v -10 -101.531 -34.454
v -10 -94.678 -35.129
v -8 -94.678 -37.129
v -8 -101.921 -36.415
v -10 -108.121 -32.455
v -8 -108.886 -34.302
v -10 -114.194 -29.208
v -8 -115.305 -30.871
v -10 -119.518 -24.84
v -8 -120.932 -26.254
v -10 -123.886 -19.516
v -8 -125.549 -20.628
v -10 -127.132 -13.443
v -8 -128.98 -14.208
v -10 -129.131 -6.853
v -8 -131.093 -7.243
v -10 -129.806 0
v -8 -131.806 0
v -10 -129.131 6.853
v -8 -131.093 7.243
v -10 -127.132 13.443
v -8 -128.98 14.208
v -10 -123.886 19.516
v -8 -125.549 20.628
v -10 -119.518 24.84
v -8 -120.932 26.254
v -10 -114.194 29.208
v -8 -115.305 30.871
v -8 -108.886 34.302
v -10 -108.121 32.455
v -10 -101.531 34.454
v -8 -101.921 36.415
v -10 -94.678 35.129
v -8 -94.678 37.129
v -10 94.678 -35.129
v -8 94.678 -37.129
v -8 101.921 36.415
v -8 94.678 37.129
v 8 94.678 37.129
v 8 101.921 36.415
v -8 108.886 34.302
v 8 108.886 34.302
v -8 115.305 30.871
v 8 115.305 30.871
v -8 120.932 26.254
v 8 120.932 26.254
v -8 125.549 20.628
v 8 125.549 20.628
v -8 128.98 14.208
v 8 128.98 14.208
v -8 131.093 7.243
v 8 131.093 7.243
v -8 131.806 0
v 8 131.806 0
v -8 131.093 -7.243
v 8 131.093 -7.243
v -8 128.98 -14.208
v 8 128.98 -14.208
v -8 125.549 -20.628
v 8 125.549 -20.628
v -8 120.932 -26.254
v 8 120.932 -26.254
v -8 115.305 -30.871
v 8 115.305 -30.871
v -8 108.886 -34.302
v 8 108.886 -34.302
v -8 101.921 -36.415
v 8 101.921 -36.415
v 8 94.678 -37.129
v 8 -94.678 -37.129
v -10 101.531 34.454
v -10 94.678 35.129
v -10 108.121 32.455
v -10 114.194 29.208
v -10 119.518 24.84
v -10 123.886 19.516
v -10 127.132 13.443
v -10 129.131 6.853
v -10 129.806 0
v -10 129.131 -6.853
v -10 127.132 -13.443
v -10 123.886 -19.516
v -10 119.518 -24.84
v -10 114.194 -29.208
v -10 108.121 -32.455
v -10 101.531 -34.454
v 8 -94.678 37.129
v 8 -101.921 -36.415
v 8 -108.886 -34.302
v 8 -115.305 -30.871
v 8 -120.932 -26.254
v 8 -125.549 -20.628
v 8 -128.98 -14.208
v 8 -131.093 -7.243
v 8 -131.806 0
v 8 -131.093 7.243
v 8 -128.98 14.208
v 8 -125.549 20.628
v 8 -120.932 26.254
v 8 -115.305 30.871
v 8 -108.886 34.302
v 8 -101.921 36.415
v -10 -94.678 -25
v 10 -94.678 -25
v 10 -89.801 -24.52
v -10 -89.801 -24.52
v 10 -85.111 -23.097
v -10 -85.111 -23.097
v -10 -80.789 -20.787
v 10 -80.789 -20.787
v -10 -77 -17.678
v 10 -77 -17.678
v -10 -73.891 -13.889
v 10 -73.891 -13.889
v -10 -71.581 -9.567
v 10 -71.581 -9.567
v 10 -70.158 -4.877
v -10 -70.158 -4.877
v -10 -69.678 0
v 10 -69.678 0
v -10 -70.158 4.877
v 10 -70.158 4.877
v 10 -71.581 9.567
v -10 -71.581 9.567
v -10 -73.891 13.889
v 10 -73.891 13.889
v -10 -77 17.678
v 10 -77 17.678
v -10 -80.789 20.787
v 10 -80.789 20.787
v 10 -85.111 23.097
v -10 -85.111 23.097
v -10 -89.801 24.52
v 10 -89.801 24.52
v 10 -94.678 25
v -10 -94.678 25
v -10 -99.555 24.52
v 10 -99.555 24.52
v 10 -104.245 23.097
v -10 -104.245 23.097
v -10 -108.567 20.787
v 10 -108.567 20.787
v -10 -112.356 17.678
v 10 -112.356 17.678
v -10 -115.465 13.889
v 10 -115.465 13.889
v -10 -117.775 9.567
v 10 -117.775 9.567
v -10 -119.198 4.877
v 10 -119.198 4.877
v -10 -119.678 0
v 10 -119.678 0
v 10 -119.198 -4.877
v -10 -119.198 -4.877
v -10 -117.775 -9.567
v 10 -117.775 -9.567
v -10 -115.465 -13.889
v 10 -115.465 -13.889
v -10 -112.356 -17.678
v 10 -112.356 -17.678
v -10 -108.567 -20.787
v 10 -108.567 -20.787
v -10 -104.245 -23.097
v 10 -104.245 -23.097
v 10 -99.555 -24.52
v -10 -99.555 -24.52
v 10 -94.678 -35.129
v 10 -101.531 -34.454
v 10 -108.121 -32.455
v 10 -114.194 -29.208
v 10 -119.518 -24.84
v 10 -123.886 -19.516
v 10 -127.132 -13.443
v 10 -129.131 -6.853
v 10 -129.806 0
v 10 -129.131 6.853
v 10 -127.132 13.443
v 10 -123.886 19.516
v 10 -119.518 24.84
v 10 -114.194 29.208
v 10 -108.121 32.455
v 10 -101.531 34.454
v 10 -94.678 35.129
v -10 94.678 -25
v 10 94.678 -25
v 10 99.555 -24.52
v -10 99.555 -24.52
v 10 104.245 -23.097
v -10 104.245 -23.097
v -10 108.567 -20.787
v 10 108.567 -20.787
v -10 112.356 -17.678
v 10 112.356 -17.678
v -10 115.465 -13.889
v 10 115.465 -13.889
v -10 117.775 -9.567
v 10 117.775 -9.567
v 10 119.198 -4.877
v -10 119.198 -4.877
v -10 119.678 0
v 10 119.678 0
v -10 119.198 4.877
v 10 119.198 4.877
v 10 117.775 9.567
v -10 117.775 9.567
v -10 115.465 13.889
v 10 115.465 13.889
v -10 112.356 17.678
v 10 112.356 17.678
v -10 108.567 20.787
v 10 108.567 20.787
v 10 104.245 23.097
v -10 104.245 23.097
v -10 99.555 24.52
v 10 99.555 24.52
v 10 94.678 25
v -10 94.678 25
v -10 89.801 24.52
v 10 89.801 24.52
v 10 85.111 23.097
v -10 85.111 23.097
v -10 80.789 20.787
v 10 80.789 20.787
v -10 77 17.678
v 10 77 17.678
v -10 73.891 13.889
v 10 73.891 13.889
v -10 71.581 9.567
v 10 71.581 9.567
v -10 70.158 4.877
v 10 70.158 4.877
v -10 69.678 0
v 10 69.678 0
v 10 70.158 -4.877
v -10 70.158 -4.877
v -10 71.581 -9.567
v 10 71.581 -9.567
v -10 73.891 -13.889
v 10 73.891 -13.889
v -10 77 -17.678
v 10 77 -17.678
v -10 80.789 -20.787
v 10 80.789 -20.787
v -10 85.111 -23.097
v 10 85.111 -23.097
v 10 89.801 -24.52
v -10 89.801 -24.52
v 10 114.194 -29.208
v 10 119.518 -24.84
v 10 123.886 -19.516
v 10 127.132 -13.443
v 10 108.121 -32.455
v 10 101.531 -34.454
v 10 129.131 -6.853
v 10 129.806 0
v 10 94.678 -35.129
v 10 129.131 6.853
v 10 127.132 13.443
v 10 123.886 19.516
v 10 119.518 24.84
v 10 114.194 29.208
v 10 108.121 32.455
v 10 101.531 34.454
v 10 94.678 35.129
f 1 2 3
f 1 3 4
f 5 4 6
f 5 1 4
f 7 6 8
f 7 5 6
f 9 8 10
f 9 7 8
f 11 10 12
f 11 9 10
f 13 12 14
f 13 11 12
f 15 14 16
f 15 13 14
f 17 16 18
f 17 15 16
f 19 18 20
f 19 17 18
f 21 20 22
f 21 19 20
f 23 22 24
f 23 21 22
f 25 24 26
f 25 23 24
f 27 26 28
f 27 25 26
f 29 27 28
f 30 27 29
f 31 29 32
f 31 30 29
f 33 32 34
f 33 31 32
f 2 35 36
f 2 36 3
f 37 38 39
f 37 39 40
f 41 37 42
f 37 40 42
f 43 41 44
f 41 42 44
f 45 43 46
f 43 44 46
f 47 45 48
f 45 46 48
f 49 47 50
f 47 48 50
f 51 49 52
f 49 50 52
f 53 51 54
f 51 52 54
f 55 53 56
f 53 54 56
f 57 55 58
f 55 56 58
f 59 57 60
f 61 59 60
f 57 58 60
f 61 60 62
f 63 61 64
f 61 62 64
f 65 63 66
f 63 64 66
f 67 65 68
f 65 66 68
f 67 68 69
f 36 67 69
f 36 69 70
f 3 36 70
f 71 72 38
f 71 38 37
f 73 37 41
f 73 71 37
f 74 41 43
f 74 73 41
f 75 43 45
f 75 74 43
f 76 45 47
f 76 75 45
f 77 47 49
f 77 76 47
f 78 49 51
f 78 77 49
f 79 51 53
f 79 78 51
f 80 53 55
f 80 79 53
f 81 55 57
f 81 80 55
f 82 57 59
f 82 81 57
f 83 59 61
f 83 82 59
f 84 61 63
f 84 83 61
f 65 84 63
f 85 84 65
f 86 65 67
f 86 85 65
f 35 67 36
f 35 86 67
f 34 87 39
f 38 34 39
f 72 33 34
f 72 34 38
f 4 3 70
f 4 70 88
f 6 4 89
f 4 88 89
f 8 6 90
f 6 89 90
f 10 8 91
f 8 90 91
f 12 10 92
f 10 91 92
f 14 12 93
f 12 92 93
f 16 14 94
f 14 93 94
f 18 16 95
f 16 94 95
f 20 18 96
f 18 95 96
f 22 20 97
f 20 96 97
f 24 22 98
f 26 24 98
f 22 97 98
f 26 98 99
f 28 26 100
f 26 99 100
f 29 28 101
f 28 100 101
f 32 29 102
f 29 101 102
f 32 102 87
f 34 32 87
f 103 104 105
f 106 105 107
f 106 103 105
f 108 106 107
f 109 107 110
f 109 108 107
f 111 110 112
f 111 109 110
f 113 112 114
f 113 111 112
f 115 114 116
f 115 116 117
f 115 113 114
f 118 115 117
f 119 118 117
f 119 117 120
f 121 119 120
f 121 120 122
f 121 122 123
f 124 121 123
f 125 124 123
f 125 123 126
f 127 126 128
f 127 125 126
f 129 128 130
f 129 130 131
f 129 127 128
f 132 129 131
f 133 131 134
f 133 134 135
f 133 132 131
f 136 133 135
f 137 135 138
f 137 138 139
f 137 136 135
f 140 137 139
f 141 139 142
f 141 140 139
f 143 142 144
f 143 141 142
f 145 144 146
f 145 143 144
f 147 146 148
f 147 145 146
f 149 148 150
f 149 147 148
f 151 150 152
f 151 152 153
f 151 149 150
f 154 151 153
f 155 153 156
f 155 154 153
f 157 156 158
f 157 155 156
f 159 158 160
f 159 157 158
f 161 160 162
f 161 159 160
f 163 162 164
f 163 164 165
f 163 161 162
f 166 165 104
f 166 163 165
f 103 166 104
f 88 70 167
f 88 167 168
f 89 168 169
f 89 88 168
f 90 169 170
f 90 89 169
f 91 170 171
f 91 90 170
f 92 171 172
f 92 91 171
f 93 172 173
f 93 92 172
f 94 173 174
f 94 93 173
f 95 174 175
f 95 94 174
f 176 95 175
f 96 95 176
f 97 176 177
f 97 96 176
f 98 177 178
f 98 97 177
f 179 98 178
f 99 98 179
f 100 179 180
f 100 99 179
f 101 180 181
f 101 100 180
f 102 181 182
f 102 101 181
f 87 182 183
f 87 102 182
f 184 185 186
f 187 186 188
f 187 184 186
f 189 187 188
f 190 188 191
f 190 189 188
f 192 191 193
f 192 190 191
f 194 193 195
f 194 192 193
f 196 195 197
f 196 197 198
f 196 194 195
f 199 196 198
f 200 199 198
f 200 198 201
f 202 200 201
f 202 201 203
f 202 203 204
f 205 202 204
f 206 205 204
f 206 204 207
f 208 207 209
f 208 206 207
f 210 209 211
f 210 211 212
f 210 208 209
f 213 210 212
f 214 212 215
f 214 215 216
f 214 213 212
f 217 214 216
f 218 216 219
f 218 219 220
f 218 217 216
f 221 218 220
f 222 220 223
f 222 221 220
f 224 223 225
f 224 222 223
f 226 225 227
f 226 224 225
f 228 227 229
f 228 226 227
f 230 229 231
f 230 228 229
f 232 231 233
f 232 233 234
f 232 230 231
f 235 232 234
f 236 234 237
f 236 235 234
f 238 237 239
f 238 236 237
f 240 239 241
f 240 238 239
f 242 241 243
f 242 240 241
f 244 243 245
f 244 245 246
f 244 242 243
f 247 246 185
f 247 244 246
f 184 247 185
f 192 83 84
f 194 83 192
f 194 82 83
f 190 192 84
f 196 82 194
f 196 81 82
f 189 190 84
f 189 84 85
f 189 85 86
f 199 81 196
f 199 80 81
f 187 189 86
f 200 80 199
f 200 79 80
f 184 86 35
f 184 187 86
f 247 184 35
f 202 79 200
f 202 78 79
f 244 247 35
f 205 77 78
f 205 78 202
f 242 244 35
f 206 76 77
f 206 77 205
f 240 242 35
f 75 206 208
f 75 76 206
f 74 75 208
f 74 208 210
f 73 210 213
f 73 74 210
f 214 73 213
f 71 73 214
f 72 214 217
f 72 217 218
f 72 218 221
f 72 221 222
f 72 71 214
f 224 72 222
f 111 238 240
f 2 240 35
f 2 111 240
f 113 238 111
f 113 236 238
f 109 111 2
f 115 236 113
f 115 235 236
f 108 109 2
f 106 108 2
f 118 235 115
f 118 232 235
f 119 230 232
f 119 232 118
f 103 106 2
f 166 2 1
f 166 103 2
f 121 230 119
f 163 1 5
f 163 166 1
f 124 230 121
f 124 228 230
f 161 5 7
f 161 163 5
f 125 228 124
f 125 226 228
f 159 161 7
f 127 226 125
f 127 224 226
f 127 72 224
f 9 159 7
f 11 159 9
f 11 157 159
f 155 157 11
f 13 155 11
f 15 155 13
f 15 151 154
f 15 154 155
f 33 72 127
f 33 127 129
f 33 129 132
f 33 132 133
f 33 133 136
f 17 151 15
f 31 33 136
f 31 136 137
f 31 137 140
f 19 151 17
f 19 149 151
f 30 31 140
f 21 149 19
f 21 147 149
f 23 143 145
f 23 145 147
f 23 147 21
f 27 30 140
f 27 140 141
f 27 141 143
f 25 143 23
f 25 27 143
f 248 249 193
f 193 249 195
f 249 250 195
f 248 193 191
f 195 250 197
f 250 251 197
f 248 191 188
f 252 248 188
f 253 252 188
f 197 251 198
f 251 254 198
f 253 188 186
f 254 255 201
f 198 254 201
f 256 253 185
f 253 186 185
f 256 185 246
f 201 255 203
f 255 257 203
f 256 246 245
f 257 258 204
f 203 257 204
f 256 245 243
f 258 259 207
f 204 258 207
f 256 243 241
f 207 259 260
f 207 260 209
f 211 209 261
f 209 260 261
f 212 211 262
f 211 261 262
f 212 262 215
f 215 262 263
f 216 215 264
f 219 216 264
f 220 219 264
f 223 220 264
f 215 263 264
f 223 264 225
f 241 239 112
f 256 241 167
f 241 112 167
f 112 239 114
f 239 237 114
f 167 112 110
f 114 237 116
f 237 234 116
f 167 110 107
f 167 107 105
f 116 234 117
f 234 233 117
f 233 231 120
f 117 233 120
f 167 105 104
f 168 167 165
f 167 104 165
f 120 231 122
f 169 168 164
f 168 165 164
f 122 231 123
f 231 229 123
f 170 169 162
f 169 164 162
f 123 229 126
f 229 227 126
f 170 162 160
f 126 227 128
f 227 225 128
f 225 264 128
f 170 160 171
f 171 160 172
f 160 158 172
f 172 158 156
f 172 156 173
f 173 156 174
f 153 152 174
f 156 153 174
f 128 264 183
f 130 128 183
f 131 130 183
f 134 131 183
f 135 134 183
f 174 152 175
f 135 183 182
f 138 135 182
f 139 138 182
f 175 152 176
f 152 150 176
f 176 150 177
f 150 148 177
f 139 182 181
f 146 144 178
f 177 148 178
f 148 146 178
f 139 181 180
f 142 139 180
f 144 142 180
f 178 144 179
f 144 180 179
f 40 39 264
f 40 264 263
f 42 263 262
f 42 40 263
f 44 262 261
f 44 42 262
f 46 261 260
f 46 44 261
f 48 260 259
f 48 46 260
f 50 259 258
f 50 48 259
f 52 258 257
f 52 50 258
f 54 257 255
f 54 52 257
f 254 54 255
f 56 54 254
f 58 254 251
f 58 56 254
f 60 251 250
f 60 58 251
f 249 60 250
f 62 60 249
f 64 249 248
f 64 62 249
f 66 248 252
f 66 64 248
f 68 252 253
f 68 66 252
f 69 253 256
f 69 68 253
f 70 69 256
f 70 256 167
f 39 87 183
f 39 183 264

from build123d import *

# Parameters (mm, degrees)
SKETCH1_R           = 25
BOSS_EXTRUDE1_DEPTH = 10
CHAMFER1_SIZE       = 2


with BuildPart() as part:
    # Sketch1 → Boss-Extrude1 (new, symmetric)
    with BuildSketch(Plane.YZ):
        with BuildLine():
            Line((94.677868983, -37.128576072), (-94.677868983, -37.128576072))
            ThreePointArc((-94.677868983, -37.128576072), (-131.806445055, 0), (-94.677868983, 37.128576072))
            Line((-94.677868983, 37.128576072), (94.677868983, 37.128576072))
            ThreePointArc((94.677868983, 37.128576072), (131.806445055, 0), (94.677868983, -37.128576072))
        make_face()
        with Locations(Location((-94.677868983, 0, 0), (0, 0, 270))):
            Circle(SKETCH1_R, mode=Mode.SUBTRACT)
        with Locations(Location((94.677868983, 0, 0), (0, 0, 270))):
            Circle(SKETCH1_R, mode=Mode.SUBTRACT)
    extrude(amount=BOSS_EXTRUDE1_DEPTH, both=True)

    # Chamfer1
    chamfer1_edges = [part.edges().sort_by_distance(p)[0] for p in [
        (10, -131.806445055, 0),
        (10, 0, -37.128576072),
        (10, 131.806445055, 0),
        (-10, 0, -37.128576072),
        (-10, -131.806445055, 0),
        (-10, 0, 37.128576072),
        (-10, 131.806445055, 0),
        (10, 0, 37.128576072),
    ]]
    chamfer(chamfer1_edges, length=CHAMFER1_SIZE)


solid = part.part
